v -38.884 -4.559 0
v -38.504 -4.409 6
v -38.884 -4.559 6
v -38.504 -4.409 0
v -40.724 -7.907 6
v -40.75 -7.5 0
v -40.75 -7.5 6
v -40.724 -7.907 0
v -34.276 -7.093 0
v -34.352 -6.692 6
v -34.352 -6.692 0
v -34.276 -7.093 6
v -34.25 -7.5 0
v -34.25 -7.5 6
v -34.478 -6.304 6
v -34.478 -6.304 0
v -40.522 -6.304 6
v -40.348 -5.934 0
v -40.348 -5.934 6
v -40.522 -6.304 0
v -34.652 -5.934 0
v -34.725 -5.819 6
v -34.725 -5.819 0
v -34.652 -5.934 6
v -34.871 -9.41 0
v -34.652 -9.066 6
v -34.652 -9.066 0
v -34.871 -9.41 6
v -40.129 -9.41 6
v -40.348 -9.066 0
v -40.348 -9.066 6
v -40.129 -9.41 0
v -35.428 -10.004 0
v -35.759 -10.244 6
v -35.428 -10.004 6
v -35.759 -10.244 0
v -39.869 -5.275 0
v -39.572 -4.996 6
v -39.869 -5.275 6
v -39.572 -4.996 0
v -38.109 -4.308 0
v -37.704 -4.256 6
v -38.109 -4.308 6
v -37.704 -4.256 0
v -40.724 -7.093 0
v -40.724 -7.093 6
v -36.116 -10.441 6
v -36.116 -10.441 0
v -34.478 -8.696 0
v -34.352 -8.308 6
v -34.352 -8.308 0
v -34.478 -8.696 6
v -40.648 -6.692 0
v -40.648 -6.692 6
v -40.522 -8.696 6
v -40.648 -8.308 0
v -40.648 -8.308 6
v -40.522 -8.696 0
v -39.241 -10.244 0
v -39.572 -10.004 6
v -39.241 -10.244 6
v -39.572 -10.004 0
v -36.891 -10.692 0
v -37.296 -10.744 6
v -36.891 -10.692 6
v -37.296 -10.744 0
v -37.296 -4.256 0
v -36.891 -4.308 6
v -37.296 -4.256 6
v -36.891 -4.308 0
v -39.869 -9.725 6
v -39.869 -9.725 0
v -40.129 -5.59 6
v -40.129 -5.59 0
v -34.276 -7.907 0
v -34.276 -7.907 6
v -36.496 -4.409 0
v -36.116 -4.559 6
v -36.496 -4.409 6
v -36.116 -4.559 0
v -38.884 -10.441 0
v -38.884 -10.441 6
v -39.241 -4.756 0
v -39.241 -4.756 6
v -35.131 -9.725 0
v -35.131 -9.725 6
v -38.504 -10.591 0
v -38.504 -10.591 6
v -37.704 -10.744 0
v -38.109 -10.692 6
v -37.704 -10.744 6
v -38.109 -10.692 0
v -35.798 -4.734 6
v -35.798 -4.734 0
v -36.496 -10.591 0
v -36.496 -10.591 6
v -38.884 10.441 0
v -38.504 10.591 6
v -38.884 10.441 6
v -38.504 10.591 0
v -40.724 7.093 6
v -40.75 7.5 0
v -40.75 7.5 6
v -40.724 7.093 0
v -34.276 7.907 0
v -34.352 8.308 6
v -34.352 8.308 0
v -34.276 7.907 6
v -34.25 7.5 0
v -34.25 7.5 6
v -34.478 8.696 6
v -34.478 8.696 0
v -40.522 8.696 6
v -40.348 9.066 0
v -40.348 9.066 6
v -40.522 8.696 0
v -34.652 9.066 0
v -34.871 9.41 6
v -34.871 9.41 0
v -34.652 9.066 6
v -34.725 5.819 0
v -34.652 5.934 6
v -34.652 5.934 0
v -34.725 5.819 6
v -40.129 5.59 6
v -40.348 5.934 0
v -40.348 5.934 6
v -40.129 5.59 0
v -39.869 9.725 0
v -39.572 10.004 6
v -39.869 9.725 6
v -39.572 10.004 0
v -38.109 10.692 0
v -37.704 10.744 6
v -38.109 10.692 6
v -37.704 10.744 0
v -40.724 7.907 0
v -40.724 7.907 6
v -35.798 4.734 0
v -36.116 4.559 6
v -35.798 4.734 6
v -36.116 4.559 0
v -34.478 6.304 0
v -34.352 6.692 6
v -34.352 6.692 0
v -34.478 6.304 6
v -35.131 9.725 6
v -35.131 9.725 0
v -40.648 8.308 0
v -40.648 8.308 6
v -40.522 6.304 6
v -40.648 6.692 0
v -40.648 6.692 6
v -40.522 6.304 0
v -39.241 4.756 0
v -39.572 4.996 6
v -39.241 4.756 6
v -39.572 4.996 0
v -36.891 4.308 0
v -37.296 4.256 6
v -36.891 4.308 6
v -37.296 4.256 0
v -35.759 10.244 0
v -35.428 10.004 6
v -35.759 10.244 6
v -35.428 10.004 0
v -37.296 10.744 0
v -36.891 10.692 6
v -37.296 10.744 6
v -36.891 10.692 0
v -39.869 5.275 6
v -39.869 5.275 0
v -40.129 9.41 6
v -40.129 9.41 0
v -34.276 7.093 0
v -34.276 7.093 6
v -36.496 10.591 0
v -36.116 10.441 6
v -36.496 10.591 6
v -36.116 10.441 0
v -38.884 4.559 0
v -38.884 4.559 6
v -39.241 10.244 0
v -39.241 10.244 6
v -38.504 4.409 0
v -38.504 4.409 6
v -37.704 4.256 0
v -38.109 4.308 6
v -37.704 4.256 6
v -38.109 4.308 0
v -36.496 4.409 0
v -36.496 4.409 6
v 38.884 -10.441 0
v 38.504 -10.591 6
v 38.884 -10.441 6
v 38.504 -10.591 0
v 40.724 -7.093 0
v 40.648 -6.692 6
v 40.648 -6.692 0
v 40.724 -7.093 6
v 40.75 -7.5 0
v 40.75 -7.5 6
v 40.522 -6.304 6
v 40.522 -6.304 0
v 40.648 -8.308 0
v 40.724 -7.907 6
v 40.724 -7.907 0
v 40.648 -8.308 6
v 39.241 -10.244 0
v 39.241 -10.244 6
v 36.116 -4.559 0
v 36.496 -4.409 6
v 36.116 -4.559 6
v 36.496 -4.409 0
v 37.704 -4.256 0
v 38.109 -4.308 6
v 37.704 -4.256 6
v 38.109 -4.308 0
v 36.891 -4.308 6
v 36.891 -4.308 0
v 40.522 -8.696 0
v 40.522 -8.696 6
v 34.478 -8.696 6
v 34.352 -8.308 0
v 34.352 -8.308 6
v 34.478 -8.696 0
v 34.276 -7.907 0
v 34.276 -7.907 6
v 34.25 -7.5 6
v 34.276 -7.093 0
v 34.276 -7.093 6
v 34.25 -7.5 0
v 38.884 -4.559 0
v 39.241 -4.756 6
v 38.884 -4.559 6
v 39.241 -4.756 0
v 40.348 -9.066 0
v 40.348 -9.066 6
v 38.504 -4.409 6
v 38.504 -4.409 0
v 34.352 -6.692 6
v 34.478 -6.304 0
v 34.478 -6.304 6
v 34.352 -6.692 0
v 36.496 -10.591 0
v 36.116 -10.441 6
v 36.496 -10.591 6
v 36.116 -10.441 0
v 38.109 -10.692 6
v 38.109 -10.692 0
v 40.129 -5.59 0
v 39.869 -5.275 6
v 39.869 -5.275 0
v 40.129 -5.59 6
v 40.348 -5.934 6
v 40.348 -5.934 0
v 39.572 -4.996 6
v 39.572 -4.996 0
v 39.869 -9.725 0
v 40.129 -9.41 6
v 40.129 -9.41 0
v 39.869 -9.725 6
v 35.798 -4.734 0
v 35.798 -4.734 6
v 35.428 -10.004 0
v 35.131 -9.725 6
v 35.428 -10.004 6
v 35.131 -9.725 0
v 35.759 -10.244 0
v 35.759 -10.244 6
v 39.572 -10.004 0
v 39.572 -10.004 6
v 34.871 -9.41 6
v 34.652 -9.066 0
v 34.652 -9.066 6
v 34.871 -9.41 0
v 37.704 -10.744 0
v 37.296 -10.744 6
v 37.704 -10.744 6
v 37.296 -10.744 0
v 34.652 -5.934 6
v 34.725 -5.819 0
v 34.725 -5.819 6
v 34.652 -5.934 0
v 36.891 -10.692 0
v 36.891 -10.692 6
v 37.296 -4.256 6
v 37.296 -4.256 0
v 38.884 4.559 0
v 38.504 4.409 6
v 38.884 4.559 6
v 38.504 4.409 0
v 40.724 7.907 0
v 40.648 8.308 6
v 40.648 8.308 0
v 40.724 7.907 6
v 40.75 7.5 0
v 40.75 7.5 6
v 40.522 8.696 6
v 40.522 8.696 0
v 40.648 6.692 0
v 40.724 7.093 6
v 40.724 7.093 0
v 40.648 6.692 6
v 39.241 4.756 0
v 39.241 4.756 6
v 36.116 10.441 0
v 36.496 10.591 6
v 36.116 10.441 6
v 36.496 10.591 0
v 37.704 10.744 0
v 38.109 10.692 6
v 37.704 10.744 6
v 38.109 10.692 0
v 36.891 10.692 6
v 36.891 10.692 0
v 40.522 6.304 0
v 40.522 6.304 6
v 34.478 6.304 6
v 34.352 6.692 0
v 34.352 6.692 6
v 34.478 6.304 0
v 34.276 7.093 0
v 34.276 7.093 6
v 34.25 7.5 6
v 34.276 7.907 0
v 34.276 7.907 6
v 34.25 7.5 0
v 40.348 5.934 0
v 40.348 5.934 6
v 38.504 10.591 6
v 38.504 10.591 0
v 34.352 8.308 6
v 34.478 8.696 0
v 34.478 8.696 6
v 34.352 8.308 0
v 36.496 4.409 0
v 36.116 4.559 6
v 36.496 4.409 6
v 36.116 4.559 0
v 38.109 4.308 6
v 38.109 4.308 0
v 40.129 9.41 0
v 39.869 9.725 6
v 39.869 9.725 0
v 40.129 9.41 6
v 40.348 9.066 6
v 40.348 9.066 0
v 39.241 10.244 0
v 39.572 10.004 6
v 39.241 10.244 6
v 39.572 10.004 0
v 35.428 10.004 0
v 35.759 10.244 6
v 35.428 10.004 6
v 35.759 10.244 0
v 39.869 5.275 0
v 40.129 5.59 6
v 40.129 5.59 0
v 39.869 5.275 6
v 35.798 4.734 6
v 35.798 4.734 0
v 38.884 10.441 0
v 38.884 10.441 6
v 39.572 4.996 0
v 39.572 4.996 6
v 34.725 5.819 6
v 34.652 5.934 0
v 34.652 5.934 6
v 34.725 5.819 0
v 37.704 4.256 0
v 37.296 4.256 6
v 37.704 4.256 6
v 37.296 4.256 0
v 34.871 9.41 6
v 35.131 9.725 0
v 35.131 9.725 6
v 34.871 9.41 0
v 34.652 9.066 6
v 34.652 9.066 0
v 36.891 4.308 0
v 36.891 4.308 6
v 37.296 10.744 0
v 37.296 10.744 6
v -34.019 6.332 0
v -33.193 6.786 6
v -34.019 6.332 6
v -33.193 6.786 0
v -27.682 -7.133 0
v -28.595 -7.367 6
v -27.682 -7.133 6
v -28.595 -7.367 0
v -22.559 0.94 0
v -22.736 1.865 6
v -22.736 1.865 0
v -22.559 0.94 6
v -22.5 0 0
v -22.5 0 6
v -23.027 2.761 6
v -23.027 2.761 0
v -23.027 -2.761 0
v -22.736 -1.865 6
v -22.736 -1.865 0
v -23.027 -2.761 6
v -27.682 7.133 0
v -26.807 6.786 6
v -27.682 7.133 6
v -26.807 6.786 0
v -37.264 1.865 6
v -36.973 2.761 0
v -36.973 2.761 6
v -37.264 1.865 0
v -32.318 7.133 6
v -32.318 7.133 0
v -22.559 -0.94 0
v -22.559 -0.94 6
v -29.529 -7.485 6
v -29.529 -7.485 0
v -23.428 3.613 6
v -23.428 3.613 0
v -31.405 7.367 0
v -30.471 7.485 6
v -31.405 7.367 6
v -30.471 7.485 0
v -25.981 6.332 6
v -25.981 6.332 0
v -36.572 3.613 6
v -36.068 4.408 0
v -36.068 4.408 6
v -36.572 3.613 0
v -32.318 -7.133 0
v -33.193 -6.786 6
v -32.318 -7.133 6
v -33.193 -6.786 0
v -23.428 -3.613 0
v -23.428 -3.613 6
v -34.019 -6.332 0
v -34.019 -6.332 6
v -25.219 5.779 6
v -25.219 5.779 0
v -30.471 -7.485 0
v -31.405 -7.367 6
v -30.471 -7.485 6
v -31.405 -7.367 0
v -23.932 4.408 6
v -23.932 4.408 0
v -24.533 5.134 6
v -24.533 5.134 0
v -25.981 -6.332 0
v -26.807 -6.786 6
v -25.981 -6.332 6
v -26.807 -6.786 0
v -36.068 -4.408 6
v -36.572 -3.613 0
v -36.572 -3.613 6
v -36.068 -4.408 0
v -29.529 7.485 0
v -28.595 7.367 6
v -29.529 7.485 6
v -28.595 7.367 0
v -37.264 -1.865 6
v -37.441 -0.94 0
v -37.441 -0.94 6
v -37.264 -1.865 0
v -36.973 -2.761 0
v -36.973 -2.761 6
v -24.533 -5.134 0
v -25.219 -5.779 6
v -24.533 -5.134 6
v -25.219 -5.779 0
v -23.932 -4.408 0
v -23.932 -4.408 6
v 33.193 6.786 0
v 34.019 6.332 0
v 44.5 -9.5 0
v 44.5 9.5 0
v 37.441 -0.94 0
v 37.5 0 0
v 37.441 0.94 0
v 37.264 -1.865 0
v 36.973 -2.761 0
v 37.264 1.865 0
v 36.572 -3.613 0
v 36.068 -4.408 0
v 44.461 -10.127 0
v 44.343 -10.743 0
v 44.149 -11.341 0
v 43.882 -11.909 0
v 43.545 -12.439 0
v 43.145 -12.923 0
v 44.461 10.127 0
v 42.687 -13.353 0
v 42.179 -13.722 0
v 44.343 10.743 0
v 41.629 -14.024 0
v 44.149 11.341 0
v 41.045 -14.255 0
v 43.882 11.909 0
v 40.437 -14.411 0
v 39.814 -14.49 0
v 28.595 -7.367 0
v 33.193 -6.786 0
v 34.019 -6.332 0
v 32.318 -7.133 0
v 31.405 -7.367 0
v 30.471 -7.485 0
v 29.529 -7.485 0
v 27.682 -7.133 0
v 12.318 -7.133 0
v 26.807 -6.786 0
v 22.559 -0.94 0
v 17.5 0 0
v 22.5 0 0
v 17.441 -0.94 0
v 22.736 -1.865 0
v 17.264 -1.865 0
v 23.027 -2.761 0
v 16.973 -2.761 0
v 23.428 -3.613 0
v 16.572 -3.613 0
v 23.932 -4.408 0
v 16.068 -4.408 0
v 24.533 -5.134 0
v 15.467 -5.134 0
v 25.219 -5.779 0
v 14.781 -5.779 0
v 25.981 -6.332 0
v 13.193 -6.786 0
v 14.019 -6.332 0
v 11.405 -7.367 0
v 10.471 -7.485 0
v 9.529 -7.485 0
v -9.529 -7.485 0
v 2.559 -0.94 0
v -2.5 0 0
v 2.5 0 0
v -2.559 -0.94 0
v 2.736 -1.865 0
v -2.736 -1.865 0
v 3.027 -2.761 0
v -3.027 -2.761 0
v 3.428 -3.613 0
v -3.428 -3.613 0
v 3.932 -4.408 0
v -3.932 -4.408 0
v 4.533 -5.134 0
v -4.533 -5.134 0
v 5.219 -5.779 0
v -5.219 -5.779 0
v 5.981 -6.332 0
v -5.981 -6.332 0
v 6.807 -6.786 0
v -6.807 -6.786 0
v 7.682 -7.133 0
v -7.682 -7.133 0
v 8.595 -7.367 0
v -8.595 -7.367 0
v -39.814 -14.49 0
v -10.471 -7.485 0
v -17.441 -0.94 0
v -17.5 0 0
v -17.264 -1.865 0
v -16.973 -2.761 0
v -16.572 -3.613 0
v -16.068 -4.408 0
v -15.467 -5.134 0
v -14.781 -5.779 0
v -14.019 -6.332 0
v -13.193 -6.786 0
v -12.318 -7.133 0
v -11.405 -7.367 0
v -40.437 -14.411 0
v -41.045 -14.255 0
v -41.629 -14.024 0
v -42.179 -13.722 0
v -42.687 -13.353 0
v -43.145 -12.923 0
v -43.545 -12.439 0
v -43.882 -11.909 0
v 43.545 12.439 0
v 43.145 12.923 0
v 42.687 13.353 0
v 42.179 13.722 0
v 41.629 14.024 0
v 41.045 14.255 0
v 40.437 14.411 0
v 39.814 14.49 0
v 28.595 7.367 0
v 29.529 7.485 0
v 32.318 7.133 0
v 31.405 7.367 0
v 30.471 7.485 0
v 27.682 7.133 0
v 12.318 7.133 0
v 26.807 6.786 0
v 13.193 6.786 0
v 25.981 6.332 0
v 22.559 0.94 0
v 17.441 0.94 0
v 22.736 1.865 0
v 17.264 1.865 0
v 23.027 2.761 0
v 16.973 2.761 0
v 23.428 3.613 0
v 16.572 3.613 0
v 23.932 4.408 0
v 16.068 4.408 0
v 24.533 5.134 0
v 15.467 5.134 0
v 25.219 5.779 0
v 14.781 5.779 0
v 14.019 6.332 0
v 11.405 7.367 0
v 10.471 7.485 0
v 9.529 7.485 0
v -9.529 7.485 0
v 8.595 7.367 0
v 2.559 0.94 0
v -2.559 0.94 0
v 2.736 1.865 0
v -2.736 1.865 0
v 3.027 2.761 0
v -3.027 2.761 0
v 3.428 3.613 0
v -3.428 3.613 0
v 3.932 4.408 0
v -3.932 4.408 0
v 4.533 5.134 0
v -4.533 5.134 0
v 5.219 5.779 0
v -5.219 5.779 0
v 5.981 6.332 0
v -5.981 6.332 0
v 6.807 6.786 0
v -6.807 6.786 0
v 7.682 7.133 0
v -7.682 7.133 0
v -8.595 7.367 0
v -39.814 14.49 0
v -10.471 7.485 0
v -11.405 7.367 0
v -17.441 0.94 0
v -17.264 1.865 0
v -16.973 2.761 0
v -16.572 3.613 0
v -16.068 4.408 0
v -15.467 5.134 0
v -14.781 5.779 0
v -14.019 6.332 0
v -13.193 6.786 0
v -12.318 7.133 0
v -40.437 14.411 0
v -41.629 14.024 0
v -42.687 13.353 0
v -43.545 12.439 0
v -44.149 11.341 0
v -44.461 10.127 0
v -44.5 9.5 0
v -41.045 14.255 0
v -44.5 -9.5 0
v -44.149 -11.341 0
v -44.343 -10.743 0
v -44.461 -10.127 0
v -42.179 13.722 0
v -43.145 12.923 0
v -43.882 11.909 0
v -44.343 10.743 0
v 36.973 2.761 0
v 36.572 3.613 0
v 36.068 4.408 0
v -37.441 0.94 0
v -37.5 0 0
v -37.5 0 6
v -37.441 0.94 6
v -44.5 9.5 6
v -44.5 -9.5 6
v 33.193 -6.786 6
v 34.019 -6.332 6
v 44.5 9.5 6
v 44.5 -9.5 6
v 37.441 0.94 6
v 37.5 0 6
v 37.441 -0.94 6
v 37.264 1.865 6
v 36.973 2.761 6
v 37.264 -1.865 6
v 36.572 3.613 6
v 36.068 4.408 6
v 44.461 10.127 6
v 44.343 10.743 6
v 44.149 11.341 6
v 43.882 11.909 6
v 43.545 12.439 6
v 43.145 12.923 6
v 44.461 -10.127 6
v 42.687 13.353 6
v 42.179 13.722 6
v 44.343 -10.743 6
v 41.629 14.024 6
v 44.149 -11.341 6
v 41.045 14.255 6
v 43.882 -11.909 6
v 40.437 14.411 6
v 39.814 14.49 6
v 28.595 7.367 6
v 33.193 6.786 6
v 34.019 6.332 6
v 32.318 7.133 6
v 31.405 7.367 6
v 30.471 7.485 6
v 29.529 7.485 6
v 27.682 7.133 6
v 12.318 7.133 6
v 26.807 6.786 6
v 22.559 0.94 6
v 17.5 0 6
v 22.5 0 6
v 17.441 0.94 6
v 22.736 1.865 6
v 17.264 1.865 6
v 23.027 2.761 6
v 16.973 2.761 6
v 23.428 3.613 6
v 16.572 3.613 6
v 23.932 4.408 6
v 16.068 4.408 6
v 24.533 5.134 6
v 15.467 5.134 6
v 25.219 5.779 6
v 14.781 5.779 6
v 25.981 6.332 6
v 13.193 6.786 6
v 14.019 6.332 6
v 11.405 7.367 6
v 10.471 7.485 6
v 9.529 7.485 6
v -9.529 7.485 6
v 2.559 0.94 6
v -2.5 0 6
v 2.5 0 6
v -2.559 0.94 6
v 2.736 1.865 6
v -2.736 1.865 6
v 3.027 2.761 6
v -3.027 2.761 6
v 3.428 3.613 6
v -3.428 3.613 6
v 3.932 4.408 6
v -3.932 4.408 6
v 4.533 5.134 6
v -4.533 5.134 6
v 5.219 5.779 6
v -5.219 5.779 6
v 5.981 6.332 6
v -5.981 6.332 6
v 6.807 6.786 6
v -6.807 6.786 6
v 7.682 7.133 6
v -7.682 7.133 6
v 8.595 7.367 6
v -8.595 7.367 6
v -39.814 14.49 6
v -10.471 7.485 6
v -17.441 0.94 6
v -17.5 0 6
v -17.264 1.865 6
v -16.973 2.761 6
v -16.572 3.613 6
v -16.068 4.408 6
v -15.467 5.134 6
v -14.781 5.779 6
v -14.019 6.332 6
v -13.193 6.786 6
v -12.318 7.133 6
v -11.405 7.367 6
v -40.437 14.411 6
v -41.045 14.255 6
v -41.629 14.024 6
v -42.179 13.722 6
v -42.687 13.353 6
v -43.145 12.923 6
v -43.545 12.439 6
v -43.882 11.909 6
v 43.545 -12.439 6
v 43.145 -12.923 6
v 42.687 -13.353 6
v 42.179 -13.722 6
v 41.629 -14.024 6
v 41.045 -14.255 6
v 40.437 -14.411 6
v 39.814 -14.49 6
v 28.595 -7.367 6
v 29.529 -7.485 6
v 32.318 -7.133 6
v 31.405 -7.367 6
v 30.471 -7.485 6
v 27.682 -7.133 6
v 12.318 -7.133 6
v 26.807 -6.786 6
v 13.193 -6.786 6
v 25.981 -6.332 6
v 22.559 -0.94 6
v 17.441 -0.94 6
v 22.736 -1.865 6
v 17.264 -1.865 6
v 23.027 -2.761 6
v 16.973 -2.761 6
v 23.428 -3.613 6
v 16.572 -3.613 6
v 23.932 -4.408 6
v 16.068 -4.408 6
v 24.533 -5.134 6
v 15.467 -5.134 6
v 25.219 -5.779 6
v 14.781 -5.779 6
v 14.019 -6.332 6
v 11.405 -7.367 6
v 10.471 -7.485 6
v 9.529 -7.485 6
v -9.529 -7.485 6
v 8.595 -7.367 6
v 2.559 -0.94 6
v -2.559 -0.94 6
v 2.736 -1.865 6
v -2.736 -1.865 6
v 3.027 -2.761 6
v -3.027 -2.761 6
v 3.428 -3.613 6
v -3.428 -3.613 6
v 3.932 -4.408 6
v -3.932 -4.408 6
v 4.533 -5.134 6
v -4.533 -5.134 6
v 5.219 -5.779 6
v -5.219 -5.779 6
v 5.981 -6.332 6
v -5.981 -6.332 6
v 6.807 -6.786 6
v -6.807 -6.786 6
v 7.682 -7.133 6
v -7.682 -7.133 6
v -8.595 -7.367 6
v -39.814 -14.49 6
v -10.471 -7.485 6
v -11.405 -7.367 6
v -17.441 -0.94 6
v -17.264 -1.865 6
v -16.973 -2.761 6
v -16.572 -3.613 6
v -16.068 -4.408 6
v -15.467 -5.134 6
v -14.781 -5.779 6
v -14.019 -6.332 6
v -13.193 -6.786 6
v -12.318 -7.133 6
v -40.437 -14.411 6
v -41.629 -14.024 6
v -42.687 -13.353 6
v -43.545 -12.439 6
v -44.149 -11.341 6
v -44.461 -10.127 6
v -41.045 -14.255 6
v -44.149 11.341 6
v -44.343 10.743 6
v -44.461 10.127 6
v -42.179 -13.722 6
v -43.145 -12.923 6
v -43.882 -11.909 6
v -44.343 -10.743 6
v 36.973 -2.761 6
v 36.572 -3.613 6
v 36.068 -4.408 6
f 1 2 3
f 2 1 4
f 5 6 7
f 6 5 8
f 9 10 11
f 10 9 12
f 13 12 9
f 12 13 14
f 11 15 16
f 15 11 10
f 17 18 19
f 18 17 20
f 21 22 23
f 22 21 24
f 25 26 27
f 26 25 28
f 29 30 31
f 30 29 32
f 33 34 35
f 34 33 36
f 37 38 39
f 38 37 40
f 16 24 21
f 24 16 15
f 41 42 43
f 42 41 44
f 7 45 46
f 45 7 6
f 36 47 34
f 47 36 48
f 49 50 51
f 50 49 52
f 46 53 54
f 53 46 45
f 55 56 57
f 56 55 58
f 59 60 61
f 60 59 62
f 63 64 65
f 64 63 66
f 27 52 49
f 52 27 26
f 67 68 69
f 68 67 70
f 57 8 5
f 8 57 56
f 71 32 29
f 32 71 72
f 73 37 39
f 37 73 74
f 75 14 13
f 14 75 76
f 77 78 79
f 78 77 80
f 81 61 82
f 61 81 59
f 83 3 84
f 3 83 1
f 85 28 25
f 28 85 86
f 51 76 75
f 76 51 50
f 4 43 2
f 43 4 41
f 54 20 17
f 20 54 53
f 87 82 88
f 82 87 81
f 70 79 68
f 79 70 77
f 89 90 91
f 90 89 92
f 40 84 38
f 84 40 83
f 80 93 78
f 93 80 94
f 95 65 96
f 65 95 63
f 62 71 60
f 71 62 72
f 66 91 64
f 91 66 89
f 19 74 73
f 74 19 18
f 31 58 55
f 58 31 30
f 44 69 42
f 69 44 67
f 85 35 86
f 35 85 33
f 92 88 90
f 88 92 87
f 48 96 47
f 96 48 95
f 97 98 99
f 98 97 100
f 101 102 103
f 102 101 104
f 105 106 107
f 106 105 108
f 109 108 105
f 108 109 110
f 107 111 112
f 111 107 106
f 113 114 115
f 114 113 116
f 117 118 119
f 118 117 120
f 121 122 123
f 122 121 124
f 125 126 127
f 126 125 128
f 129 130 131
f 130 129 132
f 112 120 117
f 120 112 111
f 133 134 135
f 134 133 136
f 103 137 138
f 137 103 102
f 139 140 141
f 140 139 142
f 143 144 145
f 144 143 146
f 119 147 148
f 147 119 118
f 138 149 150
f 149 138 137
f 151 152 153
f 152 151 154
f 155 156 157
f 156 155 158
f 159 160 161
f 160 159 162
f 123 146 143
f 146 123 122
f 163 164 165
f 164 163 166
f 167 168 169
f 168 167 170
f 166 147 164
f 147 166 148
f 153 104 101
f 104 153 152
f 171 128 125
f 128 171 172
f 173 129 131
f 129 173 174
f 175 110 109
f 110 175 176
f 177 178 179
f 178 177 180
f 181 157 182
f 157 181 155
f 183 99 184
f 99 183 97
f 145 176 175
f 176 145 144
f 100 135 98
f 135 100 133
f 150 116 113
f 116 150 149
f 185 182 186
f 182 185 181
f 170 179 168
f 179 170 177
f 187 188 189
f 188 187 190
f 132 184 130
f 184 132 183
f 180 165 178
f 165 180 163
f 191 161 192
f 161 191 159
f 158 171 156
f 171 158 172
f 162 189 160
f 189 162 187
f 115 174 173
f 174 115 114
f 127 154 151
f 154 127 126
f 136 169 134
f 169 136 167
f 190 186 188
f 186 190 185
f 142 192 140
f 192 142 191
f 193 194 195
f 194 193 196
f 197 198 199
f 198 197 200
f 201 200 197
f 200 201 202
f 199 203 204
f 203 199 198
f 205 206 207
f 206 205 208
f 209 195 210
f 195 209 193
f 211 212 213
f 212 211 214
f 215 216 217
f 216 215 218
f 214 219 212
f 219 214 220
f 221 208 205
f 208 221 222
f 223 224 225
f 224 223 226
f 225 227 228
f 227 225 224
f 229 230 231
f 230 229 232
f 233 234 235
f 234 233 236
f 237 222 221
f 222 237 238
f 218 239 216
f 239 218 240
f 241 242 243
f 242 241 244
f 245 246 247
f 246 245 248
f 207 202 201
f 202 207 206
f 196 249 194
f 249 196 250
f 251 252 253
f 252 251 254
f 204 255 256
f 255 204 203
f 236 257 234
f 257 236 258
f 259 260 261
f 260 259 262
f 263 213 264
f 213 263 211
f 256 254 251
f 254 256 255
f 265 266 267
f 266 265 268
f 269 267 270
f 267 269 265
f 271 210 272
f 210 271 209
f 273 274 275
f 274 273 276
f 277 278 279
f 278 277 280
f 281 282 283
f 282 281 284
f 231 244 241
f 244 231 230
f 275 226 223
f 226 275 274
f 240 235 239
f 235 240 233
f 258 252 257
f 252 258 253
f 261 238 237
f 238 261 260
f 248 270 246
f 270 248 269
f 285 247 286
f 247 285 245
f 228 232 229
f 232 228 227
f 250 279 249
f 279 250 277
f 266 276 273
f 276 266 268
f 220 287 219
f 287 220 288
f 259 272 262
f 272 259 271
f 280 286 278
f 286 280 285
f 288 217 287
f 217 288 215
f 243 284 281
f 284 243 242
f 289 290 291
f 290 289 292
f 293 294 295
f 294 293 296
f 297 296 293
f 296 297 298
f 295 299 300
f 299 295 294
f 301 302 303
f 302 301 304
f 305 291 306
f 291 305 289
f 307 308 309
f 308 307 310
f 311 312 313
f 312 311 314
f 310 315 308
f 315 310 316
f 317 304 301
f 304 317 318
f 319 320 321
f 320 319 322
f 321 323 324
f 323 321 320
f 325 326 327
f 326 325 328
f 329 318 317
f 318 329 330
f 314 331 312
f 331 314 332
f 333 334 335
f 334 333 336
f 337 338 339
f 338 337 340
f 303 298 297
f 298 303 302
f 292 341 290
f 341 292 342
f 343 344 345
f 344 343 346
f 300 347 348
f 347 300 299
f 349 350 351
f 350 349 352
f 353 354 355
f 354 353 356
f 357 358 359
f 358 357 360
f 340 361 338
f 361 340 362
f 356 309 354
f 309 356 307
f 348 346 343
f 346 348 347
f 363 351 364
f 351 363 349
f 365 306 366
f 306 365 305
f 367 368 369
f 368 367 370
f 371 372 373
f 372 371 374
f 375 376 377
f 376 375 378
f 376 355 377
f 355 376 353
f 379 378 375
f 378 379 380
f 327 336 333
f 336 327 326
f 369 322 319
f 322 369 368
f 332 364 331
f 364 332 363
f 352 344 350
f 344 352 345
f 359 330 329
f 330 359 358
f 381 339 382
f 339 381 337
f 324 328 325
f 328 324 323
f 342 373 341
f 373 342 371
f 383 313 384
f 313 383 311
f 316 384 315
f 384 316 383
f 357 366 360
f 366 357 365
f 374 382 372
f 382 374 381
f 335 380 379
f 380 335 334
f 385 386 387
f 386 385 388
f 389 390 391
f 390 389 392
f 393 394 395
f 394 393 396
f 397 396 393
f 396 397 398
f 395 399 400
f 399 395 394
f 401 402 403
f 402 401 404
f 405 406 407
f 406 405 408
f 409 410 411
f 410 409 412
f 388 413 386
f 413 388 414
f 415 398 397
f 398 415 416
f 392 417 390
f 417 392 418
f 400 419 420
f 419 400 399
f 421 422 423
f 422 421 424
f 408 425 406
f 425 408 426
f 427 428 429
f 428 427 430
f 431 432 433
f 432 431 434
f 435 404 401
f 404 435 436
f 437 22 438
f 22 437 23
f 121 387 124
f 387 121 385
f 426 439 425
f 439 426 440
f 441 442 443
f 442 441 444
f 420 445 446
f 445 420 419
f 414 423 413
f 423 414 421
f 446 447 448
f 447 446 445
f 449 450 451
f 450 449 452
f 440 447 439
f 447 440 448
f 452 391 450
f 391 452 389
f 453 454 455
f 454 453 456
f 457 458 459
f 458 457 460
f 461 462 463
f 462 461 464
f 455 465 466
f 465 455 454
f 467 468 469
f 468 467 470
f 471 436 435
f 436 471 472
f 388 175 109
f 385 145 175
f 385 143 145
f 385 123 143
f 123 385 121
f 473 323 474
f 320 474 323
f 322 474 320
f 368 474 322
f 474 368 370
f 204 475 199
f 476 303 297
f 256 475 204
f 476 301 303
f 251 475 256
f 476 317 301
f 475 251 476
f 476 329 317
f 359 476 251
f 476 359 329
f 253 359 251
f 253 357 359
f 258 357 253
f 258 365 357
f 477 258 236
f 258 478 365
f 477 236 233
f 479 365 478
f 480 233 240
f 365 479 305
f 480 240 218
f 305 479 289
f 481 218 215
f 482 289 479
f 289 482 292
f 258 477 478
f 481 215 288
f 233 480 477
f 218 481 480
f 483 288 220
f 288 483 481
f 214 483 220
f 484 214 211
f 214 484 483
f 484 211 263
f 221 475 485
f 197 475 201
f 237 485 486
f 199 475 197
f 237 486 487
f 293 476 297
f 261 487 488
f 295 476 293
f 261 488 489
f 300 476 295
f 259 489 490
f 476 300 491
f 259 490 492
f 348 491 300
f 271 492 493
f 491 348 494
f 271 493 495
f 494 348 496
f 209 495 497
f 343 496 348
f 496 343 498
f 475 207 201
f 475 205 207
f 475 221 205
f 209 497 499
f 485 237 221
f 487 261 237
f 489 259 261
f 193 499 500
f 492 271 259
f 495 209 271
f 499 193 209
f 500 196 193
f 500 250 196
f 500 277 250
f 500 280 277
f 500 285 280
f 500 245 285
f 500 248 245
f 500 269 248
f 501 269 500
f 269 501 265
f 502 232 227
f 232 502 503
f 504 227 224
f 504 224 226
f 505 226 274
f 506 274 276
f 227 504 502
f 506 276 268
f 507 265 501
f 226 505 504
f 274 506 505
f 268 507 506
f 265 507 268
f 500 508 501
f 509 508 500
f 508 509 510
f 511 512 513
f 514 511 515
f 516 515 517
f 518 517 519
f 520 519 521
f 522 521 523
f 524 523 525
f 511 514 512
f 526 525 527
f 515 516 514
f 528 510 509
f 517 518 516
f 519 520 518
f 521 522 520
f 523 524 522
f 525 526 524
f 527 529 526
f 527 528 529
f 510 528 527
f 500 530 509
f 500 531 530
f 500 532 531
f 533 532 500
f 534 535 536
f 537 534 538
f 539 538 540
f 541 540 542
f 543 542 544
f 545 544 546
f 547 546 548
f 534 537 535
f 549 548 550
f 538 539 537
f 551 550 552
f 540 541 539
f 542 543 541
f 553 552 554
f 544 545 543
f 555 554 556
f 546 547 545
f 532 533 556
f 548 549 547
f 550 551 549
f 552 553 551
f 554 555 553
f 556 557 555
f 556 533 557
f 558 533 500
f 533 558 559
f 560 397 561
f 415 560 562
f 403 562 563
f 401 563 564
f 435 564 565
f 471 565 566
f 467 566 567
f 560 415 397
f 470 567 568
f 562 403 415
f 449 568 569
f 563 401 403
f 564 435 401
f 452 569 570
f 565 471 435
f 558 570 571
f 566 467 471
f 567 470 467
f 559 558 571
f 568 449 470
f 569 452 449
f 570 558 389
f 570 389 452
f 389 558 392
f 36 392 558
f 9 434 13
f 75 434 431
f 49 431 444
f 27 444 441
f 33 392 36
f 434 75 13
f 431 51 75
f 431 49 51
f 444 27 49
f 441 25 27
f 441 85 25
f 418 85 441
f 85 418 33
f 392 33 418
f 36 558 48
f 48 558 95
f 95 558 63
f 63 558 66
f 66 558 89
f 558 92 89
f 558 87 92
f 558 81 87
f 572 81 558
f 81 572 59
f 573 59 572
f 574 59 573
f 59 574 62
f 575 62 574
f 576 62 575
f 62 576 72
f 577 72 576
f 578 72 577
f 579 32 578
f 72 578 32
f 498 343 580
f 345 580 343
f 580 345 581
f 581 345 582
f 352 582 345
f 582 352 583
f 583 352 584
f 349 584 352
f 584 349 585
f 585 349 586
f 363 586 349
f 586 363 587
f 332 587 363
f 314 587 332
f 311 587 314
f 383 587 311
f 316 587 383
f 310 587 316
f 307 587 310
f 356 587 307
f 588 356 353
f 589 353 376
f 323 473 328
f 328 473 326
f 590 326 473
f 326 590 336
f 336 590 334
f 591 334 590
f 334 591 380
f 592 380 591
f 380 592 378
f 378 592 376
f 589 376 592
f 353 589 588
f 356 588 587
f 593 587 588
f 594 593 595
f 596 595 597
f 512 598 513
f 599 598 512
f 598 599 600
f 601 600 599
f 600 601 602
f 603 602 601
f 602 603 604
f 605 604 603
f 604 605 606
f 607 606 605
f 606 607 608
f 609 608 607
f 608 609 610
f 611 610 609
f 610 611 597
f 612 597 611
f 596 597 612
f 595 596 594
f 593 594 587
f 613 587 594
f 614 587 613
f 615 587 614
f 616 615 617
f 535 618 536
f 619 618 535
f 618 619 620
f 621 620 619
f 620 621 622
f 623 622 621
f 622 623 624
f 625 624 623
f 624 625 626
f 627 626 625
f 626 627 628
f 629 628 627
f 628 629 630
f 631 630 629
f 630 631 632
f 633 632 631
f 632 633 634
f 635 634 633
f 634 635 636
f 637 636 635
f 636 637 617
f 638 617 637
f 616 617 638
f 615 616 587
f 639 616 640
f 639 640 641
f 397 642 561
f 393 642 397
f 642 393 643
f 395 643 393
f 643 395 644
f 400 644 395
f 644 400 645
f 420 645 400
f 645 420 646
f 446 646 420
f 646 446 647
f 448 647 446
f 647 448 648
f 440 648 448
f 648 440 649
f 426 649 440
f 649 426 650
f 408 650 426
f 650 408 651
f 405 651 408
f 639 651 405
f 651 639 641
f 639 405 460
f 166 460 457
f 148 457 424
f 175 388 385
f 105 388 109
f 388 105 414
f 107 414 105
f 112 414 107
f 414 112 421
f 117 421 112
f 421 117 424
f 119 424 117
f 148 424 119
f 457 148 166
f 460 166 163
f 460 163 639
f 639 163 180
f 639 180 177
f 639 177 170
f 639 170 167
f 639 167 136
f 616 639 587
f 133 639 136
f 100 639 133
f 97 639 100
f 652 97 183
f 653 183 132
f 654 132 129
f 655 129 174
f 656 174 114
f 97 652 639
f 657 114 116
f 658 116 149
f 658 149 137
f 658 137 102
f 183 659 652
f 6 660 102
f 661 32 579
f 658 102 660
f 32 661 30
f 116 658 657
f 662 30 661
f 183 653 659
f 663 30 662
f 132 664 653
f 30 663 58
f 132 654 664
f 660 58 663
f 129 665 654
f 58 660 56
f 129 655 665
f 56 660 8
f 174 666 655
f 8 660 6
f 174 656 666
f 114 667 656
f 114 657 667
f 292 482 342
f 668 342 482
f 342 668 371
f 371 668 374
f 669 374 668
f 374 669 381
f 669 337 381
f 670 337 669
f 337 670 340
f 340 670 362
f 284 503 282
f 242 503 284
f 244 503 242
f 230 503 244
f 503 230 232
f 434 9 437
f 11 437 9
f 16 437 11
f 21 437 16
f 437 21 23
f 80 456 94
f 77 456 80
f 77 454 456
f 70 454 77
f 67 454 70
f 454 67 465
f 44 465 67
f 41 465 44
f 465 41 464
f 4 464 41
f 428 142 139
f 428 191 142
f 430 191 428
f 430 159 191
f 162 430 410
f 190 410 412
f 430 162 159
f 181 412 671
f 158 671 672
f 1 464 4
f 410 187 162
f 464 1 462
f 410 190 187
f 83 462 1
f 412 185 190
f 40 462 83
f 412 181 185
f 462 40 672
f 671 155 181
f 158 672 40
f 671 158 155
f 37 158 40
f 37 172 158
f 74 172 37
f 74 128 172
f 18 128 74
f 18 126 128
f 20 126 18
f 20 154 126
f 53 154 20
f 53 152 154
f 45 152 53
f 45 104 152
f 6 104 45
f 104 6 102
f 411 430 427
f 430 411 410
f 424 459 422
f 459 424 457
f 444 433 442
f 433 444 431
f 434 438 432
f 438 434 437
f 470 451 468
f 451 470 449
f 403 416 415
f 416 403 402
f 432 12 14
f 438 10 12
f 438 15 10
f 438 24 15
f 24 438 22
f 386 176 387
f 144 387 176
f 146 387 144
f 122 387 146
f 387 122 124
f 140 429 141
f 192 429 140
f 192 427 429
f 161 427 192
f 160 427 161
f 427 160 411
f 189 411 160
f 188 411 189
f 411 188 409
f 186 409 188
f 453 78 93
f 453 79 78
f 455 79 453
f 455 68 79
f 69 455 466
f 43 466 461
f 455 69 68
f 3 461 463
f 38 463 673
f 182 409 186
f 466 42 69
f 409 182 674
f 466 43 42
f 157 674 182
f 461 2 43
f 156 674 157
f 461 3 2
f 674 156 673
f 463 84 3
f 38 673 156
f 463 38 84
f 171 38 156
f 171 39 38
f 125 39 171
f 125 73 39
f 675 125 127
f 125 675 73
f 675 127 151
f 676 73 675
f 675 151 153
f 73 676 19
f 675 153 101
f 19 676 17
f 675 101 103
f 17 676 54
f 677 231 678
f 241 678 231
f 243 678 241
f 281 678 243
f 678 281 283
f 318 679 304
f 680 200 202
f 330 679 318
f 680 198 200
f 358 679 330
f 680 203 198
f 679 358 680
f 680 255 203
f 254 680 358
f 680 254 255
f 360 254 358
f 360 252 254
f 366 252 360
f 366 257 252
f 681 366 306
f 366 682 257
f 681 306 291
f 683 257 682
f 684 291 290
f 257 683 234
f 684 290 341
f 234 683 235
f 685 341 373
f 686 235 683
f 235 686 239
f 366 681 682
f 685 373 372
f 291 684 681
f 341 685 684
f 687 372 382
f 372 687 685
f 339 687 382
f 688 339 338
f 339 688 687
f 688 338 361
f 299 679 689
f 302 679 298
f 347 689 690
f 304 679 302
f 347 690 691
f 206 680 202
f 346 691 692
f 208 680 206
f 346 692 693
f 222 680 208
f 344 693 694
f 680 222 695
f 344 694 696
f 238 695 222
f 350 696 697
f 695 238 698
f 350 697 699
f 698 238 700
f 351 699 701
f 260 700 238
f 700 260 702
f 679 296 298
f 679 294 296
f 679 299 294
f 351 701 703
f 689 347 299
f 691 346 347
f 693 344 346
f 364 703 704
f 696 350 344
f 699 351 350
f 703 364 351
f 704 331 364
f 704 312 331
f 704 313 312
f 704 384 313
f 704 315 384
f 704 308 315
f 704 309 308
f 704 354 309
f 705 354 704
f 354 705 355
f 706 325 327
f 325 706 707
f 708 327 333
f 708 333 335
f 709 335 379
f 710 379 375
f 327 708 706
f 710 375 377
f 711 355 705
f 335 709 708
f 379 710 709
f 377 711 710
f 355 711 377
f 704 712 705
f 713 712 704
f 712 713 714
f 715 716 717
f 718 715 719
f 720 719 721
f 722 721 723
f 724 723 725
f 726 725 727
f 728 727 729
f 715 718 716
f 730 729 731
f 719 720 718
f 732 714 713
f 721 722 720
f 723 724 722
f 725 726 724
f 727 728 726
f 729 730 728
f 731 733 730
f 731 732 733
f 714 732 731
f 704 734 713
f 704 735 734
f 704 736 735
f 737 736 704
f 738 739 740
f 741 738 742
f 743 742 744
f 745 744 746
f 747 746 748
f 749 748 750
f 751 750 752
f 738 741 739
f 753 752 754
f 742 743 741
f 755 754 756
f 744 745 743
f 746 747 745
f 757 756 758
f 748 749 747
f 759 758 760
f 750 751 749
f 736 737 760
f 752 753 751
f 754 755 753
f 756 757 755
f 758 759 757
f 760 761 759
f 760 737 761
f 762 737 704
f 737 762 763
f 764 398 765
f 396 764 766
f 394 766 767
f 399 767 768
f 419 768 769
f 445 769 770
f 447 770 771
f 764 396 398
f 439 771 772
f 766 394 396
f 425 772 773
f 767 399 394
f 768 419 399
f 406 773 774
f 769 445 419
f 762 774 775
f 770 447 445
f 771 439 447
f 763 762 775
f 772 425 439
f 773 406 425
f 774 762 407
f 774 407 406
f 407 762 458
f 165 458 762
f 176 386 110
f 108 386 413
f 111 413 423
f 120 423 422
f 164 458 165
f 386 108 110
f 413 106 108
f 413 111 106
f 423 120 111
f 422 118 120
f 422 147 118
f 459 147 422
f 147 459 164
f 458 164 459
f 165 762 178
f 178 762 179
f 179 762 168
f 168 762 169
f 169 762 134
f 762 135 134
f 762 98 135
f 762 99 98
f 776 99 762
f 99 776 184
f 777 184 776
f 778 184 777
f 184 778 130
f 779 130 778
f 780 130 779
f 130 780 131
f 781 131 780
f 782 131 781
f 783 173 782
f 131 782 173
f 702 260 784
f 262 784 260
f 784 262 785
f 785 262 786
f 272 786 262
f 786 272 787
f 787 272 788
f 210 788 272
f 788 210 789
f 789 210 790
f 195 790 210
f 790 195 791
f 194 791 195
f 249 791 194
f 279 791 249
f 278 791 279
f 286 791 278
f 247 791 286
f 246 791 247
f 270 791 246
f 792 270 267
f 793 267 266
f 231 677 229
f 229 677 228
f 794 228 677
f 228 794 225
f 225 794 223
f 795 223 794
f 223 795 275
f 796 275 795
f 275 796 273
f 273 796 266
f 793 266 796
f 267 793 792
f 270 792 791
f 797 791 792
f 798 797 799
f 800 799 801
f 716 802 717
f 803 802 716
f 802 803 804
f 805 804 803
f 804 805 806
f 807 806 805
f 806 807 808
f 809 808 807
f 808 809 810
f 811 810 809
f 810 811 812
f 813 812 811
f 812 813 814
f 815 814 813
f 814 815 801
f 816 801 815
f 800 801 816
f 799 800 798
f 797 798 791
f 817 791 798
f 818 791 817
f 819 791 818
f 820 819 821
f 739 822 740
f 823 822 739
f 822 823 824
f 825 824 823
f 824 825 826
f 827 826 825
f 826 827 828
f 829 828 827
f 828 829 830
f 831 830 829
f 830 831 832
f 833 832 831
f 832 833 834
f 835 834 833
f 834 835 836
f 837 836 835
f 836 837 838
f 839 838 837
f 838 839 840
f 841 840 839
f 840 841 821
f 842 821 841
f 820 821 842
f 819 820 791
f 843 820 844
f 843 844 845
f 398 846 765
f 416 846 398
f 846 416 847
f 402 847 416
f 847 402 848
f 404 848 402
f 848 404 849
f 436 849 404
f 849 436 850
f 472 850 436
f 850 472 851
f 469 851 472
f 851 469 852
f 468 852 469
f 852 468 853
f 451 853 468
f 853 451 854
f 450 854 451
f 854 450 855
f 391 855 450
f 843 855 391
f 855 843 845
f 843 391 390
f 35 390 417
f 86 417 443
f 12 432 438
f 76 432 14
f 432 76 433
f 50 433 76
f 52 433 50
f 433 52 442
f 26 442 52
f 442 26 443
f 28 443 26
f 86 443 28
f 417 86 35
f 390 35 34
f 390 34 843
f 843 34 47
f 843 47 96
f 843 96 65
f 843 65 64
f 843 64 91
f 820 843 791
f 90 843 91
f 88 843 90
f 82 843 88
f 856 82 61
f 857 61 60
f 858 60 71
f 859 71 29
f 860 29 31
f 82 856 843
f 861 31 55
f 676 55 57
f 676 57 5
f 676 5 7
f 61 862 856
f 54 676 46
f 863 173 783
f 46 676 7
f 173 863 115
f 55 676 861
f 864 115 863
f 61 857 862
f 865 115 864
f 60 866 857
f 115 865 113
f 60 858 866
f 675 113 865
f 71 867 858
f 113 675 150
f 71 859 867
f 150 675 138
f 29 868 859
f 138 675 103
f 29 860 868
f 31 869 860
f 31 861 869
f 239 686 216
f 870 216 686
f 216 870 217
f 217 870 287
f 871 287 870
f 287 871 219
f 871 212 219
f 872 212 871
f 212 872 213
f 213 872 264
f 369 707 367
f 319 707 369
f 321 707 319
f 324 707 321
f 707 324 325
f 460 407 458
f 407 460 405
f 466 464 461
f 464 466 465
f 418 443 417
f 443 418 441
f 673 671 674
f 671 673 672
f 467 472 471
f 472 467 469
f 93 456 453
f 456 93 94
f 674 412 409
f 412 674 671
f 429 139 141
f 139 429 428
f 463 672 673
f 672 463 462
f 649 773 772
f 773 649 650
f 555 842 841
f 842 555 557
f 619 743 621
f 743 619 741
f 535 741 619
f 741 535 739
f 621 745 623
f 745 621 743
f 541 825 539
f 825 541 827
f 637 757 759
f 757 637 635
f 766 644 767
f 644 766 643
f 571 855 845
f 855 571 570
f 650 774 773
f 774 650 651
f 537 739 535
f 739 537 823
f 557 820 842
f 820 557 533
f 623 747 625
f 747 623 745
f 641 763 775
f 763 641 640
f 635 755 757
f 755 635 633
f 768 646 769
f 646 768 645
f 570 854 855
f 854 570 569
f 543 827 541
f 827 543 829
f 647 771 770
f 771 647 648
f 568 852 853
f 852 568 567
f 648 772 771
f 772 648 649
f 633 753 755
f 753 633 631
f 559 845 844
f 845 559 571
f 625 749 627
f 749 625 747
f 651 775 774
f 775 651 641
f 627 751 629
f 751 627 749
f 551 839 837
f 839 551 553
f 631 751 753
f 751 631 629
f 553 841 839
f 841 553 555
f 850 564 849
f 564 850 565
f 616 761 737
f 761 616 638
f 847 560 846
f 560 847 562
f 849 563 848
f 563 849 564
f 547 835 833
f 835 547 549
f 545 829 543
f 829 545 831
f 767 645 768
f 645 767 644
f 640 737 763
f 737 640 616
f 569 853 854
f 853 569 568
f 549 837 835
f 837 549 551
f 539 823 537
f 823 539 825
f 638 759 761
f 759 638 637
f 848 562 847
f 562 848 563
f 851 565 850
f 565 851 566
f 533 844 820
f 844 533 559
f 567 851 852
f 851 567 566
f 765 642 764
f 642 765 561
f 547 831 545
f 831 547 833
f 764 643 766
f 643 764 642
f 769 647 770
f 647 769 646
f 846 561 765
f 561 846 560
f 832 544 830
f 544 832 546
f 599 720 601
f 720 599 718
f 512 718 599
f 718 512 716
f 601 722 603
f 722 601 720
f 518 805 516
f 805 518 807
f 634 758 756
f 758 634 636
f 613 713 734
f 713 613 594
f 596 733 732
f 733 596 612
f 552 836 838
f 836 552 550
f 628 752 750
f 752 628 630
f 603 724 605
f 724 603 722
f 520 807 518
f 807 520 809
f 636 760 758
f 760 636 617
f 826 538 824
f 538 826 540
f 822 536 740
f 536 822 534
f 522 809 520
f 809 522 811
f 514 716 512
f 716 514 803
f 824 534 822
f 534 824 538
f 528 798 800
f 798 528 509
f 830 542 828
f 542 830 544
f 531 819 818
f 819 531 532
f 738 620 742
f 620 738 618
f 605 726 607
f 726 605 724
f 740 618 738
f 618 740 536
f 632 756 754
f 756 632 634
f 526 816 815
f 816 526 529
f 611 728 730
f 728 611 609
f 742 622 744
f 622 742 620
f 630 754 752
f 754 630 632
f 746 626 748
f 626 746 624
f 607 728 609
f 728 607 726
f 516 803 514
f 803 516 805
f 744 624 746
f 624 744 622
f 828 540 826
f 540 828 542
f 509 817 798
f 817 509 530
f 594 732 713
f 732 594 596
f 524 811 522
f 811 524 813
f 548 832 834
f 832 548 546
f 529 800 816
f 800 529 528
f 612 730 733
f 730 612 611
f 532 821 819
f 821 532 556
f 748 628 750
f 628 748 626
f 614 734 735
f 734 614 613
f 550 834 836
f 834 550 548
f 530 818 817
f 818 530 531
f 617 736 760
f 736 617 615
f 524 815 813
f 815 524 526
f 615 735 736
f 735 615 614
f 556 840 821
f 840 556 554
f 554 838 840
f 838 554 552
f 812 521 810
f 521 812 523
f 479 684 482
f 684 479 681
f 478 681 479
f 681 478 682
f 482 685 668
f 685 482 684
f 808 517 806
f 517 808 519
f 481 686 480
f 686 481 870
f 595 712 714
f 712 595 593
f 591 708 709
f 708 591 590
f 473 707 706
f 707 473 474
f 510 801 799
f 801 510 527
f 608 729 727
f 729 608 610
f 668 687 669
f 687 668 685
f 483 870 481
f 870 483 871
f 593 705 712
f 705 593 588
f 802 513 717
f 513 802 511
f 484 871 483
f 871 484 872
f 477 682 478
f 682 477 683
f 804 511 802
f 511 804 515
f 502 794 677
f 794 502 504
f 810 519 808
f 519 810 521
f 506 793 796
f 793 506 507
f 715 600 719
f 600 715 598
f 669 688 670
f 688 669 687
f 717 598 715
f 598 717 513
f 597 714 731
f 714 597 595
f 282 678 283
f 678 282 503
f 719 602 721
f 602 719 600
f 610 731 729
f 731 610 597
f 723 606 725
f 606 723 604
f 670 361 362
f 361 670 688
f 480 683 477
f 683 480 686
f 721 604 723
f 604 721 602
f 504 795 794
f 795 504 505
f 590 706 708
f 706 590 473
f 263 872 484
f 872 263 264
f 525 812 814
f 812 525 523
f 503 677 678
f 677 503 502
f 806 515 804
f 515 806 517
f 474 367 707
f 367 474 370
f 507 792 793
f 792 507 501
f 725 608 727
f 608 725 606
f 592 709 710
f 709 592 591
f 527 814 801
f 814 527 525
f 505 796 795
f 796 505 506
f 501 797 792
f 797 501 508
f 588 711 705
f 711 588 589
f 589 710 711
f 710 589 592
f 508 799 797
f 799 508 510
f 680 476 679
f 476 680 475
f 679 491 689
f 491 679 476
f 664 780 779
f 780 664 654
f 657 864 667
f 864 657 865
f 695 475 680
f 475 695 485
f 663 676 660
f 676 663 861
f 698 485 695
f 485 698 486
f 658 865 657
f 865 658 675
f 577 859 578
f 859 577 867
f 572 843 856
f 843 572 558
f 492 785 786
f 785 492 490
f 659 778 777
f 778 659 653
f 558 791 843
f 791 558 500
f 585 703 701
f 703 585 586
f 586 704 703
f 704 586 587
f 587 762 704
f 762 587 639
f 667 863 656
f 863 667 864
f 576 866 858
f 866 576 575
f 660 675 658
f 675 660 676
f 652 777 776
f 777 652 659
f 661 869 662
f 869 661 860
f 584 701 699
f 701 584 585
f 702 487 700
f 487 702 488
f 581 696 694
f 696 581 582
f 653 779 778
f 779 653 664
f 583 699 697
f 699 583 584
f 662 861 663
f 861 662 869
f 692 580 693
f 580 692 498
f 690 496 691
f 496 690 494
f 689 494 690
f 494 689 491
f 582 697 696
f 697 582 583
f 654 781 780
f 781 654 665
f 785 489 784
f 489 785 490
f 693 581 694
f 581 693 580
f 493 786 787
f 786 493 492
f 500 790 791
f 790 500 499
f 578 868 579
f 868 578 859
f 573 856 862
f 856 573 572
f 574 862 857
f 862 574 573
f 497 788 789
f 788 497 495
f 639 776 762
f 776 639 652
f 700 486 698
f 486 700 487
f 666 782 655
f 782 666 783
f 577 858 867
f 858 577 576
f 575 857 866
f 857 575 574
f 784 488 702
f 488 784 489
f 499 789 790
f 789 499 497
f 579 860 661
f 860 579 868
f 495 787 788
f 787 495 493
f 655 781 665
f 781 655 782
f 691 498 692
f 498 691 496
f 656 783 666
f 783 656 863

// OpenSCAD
$fn = 50;


difference() {
	union() {
		hull() {
			translate(v = [-39.5000000000, 9.5000000000, 0]) {
				cylinder(h = 6, r = 5);
			}
			translate(v = [39.5000000000, 9.5000000000, 0]) {
				cylinder(h = 6, r = 5);
			}
			translate(v = [-39.5000000000, -9.5000000000, 0]) {
				cylinder(h = 6, r = 5);
			}
			translate(v = [39.5000000000, -9.5000000000, 0]) {
				cylinder(h = 6, r = 5);
			}
		}
	}
	union() {
		#translate(v = [-37.5000000000, -7.5000000000, -100.0000000000]) {
			cylinder(h = 200, r = 3.2500000000);
		}
		#translate(v = [-37.5000000000, 7.5000000000, -100.0000000000]) {
			cylinder(h = 200, r = 3.2500000000);
		}
		#translate(v = [37.5000000000, -7.5000000000, -100.0000000000]) {
			cylinder(h = 200, r = 3.2500000000);
		}
		#translate(v = [37.5000000000, 7.5000000000, -100.0000000000]) {
			cylinder(h = 200, r = 3.2500000000);
		}
		#translate(v = [-30.0000000000, 0, 0]) {
			cylinder(h = 6, r = 7.5000000000);
		}
		#translate(v = [-10.0000000000, 0, 0]) {
			cylinder(h = 6, r = 7.5000000000);
		}
		#translate(v = [10.0000000000, 0, 0]) {
			cylinder(h = 6, r = 7.5000000000);
		}
		#translate(v = [30.0000000000, 0, 0]) {
			cylinder(h = 6, r = 7.5000000000);
		}
	}
}
